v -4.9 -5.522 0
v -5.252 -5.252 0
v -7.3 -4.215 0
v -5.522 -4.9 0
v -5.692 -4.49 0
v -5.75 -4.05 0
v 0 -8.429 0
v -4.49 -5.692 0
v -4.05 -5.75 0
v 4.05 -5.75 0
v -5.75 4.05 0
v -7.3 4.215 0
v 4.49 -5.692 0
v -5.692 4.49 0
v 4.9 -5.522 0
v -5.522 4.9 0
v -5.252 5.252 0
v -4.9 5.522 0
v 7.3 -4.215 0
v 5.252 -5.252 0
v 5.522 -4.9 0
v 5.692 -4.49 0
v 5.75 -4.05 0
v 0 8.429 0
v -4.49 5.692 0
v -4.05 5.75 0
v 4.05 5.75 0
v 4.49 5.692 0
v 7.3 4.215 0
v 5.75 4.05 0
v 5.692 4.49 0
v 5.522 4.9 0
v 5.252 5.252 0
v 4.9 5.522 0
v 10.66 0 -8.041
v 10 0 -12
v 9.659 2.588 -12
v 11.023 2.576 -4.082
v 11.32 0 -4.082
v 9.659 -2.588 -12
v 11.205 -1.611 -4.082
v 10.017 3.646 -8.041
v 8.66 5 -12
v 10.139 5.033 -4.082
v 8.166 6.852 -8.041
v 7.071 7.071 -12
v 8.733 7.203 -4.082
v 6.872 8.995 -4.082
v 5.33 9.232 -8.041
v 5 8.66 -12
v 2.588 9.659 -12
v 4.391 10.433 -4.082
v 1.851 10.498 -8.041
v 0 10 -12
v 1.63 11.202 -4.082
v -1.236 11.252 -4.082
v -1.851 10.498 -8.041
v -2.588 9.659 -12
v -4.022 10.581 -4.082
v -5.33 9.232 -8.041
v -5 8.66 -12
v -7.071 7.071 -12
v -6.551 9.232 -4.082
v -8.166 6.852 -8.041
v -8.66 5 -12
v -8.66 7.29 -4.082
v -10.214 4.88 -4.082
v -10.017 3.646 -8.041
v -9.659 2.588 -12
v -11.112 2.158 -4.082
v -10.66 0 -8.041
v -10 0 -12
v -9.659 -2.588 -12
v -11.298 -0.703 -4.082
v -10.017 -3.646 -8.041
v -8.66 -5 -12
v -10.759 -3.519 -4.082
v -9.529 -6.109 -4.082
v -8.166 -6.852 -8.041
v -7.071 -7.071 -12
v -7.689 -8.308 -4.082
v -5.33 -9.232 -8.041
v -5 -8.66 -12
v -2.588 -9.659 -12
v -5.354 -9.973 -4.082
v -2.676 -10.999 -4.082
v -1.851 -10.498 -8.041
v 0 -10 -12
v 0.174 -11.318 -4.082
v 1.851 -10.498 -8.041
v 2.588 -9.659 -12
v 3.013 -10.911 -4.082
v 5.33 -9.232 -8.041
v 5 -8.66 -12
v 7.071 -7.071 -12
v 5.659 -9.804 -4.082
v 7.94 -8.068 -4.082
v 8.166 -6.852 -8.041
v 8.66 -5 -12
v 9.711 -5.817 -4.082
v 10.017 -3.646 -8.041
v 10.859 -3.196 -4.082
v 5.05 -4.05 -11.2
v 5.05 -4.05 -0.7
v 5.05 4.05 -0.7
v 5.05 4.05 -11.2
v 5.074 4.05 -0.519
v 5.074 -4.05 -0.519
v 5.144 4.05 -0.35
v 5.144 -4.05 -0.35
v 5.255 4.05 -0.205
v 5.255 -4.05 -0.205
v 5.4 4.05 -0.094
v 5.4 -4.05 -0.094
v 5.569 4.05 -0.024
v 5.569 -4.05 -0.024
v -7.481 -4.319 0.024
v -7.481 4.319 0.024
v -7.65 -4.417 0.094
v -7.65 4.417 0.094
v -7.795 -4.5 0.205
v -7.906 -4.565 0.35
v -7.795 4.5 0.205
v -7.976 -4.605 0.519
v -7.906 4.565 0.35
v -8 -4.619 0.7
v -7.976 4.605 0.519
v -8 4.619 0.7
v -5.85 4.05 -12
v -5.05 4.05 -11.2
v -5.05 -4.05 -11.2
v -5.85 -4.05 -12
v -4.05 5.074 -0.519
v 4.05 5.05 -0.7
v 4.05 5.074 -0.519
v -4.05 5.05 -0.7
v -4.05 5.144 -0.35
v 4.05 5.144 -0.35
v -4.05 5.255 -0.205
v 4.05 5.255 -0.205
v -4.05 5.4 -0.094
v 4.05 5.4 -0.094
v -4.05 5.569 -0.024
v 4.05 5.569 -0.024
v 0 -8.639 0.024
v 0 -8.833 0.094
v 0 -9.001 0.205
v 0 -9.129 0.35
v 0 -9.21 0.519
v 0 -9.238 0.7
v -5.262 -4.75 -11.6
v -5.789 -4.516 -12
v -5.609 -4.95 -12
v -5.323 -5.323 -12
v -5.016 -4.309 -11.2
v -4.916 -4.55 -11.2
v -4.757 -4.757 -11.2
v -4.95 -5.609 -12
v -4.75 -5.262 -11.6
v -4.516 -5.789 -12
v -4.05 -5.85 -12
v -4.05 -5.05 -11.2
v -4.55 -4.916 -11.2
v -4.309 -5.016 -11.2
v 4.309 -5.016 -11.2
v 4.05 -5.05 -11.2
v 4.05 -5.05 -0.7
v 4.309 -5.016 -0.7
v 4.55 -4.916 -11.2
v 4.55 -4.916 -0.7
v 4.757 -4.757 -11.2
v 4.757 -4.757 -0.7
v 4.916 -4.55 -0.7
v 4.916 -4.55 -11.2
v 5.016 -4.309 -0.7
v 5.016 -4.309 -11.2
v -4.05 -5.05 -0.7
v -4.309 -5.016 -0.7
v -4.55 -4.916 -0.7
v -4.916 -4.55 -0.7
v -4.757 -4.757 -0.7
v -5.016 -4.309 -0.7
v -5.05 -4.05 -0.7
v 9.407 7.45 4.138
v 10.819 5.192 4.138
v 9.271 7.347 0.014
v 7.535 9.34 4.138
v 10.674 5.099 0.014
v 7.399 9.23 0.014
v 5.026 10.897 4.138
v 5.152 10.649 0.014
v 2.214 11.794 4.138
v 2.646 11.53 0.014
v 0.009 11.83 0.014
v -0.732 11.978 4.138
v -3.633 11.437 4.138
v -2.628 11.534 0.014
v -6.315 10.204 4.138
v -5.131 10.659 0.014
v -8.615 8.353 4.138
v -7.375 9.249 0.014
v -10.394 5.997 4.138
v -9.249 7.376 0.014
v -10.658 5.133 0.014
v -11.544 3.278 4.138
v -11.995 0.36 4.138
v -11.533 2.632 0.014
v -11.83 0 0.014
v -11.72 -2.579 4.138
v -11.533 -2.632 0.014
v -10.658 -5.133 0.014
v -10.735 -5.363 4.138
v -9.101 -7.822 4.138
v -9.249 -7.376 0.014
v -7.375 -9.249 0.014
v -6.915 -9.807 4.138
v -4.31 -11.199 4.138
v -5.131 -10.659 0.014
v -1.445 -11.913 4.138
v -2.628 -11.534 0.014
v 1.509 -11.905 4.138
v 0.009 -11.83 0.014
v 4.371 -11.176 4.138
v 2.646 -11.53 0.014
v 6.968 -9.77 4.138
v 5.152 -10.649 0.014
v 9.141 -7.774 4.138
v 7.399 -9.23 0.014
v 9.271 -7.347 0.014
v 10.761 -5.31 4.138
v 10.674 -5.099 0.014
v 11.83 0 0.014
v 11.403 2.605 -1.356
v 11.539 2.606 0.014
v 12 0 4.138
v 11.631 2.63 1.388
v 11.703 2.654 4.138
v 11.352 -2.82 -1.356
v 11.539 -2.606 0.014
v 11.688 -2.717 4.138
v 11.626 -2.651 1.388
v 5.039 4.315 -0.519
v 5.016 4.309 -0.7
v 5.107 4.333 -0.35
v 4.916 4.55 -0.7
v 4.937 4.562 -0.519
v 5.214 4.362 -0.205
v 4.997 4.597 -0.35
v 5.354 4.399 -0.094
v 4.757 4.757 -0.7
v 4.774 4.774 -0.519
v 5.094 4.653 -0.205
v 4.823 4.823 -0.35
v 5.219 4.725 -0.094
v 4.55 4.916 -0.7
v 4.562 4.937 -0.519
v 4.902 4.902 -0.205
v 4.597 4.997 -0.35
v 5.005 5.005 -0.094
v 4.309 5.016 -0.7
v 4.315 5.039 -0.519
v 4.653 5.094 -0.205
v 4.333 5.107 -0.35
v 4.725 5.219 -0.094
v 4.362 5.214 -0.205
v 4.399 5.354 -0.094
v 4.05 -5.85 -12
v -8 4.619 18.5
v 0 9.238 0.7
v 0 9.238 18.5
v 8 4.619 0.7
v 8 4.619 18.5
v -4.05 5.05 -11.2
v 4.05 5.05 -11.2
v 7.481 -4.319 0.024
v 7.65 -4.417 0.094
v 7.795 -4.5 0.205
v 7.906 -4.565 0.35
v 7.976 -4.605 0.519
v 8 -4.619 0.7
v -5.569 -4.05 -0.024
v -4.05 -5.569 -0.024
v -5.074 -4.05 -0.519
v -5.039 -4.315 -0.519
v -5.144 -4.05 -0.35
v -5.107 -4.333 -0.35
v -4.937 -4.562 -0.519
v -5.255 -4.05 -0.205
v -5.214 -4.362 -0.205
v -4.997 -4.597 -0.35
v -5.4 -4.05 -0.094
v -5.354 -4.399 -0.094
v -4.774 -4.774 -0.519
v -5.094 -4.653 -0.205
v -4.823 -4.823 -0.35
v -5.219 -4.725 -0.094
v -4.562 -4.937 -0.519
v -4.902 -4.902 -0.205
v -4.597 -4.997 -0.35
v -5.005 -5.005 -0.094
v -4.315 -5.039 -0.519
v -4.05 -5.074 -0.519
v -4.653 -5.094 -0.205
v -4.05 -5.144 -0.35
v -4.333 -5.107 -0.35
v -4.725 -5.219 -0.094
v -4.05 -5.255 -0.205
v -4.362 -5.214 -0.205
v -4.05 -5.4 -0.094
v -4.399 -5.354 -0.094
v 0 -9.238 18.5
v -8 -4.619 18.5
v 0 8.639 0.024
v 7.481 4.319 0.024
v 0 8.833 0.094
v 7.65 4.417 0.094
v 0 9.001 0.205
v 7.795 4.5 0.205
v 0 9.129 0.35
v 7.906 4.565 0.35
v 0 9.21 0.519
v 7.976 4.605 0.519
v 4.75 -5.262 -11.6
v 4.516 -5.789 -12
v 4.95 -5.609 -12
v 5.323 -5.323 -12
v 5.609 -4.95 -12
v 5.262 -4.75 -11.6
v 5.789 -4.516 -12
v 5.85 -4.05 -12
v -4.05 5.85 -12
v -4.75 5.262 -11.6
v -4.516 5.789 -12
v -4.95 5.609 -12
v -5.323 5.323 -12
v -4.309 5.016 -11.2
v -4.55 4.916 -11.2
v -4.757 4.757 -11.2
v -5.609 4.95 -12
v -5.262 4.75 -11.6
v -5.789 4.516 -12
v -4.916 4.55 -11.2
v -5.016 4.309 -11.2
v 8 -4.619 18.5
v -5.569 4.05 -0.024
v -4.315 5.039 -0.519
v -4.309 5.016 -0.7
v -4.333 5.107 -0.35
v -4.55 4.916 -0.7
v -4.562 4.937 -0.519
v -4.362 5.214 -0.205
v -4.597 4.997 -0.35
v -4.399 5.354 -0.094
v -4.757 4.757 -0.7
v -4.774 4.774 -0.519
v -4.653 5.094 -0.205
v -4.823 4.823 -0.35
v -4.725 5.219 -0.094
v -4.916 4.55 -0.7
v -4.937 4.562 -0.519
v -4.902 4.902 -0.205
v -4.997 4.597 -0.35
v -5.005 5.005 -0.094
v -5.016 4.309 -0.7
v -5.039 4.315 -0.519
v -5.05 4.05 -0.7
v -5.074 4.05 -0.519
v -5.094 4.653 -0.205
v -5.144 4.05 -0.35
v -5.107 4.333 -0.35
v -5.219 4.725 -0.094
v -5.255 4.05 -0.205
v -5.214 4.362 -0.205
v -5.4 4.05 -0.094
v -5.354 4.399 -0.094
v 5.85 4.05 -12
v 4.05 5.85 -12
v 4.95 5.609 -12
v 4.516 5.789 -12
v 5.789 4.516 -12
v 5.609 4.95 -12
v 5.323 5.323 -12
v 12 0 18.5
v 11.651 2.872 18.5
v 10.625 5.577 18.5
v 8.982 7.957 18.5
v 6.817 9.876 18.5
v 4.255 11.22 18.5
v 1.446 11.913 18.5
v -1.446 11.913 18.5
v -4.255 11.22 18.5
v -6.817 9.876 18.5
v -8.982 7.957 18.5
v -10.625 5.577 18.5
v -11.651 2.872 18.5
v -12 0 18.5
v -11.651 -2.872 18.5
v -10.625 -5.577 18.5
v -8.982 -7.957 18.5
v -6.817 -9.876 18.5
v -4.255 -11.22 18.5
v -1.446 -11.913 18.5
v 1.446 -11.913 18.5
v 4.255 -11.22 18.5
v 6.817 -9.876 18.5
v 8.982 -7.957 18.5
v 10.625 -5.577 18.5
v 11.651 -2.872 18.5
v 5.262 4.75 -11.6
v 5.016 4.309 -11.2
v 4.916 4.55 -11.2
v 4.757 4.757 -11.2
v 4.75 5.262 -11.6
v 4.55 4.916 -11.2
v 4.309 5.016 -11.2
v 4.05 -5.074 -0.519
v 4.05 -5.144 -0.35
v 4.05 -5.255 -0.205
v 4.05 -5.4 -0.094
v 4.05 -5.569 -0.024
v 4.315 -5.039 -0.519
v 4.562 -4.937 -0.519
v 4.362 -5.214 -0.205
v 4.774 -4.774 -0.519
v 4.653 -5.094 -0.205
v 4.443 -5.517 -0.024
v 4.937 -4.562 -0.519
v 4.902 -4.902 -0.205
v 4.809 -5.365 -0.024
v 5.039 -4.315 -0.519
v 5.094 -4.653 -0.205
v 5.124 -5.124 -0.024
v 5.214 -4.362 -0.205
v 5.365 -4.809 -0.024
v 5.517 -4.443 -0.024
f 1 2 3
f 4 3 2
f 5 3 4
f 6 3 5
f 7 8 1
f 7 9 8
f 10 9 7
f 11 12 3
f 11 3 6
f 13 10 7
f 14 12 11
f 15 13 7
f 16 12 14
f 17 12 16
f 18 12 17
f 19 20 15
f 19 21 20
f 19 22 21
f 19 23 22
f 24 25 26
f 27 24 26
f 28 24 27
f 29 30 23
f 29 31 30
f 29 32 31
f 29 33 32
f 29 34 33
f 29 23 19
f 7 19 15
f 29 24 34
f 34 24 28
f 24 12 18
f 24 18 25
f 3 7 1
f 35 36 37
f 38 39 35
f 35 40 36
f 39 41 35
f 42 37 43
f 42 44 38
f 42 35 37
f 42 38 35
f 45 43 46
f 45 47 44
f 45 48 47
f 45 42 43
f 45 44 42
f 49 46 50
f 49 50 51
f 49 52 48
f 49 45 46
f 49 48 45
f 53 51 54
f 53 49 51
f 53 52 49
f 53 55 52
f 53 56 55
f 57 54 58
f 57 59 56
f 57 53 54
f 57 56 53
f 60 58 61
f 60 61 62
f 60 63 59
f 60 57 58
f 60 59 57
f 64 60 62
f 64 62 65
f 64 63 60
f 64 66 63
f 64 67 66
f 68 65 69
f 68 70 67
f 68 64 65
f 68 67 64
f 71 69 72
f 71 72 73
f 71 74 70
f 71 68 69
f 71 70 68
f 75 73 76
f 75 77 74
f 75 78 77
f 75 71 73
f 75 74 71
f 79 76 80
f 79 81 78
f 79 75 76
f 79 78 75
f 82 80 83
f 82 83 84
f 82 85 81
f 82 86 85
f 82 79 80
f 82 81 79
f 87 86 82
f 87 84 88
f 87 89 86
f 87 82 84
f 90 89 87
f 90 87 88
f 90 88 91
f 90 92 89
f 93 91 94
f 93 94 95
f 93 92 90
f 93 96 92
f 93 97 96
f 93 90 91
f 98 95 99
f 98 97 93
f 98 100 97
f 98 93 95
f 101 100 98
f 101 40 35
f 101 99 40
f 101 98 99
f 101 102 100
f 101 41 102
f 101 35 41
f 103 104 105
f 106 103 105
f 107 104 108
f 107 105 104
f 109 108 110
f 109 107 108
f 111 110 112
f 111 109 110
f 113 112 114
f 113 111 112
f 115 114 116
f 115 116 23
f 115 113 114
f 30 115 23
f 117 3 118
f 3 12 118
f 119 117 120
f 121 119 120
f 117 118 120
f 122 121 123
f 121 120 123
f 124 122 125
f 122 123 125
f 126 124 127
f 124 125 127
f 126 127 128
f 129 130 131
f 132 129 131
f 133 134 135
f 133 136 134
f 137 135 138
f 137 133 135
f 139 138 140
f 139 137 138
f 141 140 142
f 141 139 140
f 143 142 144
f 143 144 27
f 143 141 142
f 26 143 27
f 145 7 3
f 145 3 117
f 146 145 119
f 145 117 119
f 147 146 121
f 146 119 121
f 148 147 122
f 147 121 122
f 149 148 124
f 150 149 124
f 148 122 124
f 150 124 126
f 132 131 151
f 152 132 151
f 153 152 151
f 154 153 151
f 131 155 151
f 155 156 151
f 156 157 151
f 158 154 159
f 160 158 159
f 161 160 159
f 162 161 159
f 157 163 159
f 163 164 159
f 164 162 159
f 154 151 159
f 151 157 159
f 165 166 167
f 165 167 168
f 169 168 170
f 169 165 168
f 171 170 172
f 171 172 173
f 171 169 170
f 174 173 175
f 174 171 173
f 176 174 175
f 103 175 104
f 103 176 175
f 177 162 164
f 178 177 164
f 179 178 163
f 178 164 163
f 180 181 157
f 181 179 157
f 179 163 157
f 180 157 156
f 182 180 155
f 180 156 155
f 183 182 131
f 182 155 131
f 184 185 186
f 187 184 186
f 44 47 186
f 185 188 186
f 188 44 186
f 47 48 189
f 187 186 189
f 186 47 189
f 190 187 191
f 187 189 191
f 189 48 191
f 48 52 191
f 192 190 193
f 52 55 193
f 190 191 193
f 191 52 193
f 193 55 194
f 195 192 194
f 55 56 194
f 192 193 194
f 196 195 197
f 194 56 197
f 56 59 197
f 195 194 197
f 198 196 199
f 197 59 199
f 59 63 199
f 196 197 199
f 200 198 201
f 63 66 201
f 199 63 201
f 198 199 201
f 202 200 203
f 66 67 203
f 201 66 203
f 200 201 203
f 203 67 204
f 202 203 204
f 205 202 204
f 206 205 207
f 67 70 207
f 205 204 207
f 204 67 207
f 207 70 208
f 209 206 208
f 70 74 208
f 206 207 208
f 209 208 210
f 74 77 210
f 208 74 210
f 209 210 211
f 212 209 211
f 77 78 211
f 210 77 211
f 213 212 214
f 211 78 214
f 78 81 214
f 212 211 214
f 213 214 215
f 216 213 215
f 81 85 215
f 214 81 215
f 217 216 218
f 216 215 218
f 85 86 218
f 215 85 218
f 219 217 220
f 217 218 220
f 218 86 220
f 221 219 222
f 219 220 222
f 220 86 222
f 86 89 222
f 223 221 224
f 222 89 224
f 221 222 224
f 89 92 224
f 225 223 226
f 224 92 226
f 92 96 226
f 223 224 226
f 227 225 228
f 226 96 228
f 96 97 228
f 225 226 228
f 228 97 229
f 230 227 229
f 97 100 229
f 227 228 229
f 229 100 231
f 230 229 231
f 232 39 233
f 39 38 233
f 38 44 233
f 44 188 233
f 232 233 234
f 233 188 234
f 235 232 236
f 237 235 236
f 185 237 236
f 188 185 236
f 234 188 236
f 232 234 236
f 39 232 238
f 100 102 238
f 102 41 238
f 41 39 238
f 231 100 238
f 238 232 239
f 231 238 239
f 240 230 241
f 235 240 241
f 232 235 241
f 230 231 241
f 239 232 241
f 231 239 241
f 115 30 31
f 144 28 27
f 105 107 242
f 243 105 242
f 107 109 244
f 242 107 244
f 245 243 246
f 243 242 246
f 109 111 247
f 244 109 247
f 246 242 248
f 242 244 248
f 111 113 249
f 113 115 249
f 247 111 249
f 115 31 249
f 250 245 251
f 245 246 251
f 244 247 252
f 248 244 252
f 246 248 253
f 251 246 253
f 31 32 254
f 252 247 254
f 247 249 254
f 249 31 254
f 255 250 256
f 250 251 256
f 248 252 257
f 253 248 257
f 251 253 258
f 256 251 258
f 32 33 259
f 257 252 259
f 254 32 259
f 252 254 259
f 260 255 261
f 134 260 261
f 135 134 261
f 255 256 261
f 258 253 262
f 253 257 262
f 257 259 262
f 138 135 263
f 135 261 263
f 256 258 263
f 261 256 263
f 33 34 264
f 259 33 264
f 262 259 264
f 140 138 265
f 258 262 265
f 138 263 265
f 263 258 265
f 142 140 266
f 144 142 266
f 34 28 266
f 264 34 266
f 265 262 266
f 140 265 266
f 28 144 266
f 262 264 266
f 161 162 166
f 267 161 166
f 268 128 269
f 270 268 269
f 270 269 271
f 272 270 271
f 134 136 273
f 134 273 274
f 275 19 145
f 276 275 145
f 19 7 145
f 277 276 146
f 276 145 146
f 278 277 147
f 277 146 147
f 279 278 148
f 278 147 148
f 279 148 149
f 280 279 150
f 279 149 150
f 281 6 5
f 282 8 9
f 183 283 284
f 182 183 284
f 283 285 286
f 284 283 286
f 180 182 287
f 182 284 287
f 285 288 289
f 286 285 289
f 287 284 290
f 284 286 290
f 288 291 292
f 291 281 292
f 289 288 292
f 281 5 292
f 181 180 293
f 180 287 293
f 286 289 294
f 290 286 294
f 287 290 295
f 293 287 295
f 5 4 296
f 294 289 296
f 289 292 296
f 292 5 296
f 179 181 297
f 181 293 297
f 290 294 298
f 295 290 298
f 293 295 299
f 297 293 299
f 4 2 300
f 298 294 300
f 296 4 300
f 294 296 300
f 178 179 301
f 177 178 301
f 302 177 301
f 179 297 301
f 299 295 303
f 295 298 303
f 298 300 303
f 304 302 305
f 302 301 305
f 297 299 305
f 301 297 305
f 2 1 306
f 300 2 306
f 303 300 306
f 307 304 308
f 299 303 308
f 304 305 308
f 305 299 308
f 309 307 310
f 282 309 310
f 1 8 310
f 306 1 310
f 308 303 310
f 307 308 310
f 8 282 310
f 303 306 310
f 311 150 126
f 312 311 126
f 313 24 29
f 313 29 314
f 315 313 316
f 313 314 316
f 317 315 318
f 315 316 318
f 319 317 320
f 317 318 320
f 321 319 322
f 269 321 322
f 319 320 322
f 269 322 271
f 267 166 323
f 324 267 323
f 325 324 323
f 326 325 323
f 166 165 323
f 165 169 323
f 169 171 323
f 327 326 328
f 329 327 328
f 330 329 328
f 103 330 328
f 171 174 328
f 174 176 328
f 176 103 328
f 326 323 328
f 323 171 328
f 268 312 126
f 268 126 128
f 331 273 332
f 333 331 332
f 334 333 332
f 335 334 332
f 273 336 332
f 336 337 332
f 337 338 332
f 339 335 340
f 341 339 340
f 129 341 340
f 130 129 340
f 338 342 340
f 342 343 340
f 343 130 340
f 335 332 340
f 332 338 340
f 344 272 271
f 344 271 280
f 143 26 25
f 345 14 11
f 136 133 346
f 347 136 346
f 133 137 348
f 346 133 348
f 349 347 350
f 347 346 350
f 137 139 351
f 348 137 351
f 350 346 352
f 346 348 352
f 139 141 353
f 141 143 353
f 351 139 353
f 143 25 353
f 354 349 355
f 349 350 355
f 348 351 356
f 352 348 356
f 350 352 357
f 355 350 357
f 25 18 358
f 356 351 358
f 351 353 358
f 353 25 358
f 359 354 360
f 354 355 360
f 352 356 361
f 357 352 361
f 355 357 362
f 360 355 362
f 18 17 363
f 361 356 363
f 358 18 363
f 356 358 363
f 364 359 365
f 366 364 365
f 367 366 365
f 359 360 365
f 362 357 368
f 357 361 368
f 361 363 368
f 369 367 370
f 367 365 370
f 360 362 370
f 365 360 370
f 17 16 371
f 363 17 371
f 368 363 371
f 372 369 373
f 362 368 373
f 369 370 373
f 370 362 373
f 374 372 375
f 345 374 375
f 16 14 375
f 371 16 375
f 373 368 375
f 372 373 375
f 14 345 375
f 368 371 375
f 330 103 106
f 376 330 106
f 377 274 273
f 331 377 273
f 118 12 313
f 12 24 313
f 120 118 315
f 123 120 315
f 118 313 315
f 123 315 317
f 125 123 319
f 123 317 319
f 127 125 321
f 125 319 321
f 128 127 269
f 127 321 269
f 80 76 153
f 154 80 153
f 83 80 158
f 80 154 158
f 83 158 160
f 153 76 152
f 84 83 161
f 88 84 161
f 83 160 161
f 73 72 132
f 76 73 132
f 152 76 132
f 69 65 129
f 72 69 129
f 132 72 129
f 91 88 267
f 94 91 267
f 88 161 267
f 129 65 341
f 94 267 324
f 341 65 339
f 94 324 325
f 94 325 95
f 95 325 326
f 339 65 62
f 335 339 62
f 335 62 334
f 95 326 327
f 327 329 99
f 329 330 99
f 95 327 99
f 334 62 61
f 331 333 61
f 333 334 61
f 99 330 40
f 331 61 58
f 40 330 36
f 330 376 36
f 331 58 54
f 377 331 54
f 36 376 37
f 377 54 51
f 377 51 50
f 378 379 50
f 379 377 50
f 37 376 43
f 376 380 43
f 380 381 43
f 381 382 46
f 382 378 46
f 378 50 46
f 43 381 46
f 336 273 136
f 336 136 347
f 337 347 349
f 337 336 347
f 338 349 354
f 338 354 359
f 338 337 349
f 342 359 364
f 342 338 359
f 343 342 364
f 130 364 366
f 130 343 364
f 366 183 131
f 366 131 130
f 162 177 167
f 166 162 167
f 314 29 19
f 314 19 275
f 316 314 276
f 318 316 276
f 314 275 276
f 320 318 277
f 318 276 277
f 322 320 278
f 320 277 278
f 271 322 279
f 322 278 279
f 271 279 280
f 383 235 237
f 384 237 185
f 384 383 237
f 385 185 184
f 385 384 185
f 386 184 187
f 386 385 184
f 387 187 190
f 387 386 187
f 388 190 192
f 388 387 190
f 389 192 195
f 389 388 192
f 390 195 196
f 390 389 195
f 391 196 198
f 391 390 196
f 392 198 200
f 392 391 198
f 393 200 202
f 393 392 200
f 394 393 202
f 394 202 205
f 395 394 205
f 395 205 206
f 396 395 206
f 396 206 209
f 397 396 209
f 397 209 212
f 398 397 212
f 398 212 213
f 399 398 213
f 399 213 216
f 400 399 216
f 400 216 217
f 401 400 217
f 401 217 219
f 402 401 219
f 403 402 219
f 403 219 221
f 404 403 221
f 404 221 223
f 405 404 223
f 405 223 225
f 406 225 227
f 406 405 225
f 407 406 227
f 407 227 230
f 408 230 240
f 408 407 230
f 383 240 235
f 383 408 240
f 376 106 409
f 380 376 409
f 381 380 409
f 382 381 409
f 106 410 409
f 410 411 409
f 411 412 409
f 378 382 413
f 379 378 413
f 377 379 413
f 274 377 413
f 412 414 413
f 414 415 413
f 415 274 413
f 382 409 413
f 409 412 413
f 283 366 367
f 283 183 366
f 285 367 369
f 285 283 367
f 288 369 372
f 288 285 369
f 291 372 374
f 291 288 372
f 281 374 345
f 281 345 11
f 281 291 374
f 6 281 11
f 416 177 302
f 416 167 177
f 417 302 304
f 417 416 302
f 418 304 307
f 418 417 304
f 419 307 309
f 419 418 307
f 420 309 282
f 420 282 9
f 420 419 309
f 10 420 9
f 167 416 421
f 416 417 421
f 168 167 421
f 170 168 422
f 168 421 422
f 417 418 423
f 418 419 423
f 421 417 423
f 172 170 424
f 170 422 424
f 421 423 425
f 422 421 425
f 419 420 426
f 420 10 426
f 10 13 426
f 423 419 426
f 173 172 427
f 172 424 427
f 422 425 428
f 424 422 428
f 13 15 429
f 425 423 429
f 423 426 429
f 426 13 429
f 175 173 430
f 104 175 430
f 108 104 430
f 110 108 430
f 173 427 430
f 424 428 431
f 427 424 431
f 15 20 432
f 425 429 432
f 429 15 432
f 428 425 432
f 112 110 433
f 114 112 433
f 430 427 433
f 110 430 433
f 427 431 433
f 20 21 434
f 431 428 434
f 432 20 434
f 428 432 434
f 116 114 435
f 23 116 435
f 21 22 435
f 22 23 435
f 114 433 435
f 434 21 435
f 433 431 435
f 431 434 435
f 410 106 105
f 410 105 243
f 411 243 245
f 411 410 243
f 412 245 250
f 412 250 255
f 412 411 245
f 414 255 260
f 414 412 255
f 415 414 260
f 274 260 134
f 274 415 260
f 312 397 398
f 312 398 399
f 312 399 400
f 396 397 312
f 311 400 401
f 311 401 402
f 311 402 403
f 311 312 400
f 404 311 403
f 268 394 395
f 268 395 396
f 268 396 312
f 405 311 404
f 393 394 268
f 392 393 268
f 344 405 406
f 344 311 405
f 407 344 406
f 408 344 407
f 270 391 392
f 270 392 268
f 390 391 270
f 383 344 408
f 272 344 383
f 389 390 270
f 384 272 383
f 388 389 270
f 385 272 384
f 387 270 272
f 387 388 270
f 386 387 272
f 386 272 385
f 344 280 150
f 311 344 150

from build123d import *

# Parameters (mm, degrees)
F0_R     = 12
F1_DEPTH = 18.5
F0_W     = 10.1
F0_H     = 10.1
F2_DEPTH = 12
F3_SIZE2 = 11.99999
F3_SIZE  = 1.99999
F4_R     = 1
F5_R     = 0.7
F6_R     = 50
F7_SIZE  = 0.8


# Not quite as in the source:
# - a fillet or chamfer is up to 0.001 mm smaller than in the source, because OpenCascade refuses the exact size


with BuildPart() as f1:
    # F0 (on Top) → F1 (new body)
    with BuildSketch(Plane.XY):
        Circle(F0_R)
        Polygon((0, 9.237604307), (8, 4.6188021535), (8, -4.6188021535), (0, -9.237604307), (-8, -4.6188021535), (-8, 4.6188021535), align=None, mode=Mode.SUBTRACT)
    extrude(amount=F1_DEPTH)

    # F0 (on Top) → F2 (join)
    with BuildSketch(Plane.XY):
        Circle(F0_R)
        Polygon((0, 9.237604307), (8, 4.6188021535), (8, -4.6188021535), (0, -9.237604307), (-8, -4.6188021535), (-8, 4.6188021535), align=None, mode=Mode.SUBTRACT)
        Polygon((8, -4.6188021535), (8, 4.6188021535), (0, 9.237604307), (-8, 4.6188021535), (-8, -4.6188021535), (0, -9.237604307), align=None)
        Rectangle(F0_W, F0_H, mode=Mode.SUBTRACT)
    extrude(amount=-F2_DEPTH)

    # F3 (size 2 and 12 in the source; OpenCascade refuses exactly that, so slightly less here)
    f3_edges = [f1.edges().sort_by_distance(p)[0] for p in [
        (-12, 0, -12),
    ]]
    f3_side = f1.faces().sort_by_distance((5.389411, 0, -12))[0]
    chamfer(f3_edges, length=F3_SIZE, length2=F3_SIZE2, reference=f3_side)

    # F4
    f4_edges = [f1.edges().sort_by_distance(p)[0] for p in [
        (-5.05, 5.05, -6),
        (5.05, 5.05, -6),
        (5.05, -5.05, -6),
        (-5.05, -5.05, -6),
    ]]
    fillet(f4_edges, radius=F4_R)

    # F5
    f5_edges = [f1.edges().sort_by_distance(p)[0] for p in [
        (4, -6.928203, 0),
        (-4, -6.928203, 0),
        (5.05, 0, 0),
        (4.757107, 4.757107, 0),
        (4.757107, -4.757107, 0),
        (0, 5.05, 0),
        (0, -5.05, 0),
        (-4.757107, 4.757107, 0),
        (-4.757107, -4.757107, 0),
        (-5.05, 0, 0),
        (-4, 6.928203, 0),
        (4, 6.928203, 0),
        (8, 0, 0),
        (-8, 0, 0),
    ]]
    fillet(f5_edges, radius=F5_R)

    # F6
    f6_edges = [f1.edges().sort_by_distance(p)[0] for p in [
        (-12, 0, -1e-05),
        (-12, 0, 0),
    ]]
    fillet(f6_edges, radius=F6_R)

    # F7
    f7_edges = [f1.edges().sort_by_distance(p)[0] for p in [
        (5.05, 0, -12),
    ]]
    chamfer(f7_edges, length=F7_SIZE)


solid = f1.part
